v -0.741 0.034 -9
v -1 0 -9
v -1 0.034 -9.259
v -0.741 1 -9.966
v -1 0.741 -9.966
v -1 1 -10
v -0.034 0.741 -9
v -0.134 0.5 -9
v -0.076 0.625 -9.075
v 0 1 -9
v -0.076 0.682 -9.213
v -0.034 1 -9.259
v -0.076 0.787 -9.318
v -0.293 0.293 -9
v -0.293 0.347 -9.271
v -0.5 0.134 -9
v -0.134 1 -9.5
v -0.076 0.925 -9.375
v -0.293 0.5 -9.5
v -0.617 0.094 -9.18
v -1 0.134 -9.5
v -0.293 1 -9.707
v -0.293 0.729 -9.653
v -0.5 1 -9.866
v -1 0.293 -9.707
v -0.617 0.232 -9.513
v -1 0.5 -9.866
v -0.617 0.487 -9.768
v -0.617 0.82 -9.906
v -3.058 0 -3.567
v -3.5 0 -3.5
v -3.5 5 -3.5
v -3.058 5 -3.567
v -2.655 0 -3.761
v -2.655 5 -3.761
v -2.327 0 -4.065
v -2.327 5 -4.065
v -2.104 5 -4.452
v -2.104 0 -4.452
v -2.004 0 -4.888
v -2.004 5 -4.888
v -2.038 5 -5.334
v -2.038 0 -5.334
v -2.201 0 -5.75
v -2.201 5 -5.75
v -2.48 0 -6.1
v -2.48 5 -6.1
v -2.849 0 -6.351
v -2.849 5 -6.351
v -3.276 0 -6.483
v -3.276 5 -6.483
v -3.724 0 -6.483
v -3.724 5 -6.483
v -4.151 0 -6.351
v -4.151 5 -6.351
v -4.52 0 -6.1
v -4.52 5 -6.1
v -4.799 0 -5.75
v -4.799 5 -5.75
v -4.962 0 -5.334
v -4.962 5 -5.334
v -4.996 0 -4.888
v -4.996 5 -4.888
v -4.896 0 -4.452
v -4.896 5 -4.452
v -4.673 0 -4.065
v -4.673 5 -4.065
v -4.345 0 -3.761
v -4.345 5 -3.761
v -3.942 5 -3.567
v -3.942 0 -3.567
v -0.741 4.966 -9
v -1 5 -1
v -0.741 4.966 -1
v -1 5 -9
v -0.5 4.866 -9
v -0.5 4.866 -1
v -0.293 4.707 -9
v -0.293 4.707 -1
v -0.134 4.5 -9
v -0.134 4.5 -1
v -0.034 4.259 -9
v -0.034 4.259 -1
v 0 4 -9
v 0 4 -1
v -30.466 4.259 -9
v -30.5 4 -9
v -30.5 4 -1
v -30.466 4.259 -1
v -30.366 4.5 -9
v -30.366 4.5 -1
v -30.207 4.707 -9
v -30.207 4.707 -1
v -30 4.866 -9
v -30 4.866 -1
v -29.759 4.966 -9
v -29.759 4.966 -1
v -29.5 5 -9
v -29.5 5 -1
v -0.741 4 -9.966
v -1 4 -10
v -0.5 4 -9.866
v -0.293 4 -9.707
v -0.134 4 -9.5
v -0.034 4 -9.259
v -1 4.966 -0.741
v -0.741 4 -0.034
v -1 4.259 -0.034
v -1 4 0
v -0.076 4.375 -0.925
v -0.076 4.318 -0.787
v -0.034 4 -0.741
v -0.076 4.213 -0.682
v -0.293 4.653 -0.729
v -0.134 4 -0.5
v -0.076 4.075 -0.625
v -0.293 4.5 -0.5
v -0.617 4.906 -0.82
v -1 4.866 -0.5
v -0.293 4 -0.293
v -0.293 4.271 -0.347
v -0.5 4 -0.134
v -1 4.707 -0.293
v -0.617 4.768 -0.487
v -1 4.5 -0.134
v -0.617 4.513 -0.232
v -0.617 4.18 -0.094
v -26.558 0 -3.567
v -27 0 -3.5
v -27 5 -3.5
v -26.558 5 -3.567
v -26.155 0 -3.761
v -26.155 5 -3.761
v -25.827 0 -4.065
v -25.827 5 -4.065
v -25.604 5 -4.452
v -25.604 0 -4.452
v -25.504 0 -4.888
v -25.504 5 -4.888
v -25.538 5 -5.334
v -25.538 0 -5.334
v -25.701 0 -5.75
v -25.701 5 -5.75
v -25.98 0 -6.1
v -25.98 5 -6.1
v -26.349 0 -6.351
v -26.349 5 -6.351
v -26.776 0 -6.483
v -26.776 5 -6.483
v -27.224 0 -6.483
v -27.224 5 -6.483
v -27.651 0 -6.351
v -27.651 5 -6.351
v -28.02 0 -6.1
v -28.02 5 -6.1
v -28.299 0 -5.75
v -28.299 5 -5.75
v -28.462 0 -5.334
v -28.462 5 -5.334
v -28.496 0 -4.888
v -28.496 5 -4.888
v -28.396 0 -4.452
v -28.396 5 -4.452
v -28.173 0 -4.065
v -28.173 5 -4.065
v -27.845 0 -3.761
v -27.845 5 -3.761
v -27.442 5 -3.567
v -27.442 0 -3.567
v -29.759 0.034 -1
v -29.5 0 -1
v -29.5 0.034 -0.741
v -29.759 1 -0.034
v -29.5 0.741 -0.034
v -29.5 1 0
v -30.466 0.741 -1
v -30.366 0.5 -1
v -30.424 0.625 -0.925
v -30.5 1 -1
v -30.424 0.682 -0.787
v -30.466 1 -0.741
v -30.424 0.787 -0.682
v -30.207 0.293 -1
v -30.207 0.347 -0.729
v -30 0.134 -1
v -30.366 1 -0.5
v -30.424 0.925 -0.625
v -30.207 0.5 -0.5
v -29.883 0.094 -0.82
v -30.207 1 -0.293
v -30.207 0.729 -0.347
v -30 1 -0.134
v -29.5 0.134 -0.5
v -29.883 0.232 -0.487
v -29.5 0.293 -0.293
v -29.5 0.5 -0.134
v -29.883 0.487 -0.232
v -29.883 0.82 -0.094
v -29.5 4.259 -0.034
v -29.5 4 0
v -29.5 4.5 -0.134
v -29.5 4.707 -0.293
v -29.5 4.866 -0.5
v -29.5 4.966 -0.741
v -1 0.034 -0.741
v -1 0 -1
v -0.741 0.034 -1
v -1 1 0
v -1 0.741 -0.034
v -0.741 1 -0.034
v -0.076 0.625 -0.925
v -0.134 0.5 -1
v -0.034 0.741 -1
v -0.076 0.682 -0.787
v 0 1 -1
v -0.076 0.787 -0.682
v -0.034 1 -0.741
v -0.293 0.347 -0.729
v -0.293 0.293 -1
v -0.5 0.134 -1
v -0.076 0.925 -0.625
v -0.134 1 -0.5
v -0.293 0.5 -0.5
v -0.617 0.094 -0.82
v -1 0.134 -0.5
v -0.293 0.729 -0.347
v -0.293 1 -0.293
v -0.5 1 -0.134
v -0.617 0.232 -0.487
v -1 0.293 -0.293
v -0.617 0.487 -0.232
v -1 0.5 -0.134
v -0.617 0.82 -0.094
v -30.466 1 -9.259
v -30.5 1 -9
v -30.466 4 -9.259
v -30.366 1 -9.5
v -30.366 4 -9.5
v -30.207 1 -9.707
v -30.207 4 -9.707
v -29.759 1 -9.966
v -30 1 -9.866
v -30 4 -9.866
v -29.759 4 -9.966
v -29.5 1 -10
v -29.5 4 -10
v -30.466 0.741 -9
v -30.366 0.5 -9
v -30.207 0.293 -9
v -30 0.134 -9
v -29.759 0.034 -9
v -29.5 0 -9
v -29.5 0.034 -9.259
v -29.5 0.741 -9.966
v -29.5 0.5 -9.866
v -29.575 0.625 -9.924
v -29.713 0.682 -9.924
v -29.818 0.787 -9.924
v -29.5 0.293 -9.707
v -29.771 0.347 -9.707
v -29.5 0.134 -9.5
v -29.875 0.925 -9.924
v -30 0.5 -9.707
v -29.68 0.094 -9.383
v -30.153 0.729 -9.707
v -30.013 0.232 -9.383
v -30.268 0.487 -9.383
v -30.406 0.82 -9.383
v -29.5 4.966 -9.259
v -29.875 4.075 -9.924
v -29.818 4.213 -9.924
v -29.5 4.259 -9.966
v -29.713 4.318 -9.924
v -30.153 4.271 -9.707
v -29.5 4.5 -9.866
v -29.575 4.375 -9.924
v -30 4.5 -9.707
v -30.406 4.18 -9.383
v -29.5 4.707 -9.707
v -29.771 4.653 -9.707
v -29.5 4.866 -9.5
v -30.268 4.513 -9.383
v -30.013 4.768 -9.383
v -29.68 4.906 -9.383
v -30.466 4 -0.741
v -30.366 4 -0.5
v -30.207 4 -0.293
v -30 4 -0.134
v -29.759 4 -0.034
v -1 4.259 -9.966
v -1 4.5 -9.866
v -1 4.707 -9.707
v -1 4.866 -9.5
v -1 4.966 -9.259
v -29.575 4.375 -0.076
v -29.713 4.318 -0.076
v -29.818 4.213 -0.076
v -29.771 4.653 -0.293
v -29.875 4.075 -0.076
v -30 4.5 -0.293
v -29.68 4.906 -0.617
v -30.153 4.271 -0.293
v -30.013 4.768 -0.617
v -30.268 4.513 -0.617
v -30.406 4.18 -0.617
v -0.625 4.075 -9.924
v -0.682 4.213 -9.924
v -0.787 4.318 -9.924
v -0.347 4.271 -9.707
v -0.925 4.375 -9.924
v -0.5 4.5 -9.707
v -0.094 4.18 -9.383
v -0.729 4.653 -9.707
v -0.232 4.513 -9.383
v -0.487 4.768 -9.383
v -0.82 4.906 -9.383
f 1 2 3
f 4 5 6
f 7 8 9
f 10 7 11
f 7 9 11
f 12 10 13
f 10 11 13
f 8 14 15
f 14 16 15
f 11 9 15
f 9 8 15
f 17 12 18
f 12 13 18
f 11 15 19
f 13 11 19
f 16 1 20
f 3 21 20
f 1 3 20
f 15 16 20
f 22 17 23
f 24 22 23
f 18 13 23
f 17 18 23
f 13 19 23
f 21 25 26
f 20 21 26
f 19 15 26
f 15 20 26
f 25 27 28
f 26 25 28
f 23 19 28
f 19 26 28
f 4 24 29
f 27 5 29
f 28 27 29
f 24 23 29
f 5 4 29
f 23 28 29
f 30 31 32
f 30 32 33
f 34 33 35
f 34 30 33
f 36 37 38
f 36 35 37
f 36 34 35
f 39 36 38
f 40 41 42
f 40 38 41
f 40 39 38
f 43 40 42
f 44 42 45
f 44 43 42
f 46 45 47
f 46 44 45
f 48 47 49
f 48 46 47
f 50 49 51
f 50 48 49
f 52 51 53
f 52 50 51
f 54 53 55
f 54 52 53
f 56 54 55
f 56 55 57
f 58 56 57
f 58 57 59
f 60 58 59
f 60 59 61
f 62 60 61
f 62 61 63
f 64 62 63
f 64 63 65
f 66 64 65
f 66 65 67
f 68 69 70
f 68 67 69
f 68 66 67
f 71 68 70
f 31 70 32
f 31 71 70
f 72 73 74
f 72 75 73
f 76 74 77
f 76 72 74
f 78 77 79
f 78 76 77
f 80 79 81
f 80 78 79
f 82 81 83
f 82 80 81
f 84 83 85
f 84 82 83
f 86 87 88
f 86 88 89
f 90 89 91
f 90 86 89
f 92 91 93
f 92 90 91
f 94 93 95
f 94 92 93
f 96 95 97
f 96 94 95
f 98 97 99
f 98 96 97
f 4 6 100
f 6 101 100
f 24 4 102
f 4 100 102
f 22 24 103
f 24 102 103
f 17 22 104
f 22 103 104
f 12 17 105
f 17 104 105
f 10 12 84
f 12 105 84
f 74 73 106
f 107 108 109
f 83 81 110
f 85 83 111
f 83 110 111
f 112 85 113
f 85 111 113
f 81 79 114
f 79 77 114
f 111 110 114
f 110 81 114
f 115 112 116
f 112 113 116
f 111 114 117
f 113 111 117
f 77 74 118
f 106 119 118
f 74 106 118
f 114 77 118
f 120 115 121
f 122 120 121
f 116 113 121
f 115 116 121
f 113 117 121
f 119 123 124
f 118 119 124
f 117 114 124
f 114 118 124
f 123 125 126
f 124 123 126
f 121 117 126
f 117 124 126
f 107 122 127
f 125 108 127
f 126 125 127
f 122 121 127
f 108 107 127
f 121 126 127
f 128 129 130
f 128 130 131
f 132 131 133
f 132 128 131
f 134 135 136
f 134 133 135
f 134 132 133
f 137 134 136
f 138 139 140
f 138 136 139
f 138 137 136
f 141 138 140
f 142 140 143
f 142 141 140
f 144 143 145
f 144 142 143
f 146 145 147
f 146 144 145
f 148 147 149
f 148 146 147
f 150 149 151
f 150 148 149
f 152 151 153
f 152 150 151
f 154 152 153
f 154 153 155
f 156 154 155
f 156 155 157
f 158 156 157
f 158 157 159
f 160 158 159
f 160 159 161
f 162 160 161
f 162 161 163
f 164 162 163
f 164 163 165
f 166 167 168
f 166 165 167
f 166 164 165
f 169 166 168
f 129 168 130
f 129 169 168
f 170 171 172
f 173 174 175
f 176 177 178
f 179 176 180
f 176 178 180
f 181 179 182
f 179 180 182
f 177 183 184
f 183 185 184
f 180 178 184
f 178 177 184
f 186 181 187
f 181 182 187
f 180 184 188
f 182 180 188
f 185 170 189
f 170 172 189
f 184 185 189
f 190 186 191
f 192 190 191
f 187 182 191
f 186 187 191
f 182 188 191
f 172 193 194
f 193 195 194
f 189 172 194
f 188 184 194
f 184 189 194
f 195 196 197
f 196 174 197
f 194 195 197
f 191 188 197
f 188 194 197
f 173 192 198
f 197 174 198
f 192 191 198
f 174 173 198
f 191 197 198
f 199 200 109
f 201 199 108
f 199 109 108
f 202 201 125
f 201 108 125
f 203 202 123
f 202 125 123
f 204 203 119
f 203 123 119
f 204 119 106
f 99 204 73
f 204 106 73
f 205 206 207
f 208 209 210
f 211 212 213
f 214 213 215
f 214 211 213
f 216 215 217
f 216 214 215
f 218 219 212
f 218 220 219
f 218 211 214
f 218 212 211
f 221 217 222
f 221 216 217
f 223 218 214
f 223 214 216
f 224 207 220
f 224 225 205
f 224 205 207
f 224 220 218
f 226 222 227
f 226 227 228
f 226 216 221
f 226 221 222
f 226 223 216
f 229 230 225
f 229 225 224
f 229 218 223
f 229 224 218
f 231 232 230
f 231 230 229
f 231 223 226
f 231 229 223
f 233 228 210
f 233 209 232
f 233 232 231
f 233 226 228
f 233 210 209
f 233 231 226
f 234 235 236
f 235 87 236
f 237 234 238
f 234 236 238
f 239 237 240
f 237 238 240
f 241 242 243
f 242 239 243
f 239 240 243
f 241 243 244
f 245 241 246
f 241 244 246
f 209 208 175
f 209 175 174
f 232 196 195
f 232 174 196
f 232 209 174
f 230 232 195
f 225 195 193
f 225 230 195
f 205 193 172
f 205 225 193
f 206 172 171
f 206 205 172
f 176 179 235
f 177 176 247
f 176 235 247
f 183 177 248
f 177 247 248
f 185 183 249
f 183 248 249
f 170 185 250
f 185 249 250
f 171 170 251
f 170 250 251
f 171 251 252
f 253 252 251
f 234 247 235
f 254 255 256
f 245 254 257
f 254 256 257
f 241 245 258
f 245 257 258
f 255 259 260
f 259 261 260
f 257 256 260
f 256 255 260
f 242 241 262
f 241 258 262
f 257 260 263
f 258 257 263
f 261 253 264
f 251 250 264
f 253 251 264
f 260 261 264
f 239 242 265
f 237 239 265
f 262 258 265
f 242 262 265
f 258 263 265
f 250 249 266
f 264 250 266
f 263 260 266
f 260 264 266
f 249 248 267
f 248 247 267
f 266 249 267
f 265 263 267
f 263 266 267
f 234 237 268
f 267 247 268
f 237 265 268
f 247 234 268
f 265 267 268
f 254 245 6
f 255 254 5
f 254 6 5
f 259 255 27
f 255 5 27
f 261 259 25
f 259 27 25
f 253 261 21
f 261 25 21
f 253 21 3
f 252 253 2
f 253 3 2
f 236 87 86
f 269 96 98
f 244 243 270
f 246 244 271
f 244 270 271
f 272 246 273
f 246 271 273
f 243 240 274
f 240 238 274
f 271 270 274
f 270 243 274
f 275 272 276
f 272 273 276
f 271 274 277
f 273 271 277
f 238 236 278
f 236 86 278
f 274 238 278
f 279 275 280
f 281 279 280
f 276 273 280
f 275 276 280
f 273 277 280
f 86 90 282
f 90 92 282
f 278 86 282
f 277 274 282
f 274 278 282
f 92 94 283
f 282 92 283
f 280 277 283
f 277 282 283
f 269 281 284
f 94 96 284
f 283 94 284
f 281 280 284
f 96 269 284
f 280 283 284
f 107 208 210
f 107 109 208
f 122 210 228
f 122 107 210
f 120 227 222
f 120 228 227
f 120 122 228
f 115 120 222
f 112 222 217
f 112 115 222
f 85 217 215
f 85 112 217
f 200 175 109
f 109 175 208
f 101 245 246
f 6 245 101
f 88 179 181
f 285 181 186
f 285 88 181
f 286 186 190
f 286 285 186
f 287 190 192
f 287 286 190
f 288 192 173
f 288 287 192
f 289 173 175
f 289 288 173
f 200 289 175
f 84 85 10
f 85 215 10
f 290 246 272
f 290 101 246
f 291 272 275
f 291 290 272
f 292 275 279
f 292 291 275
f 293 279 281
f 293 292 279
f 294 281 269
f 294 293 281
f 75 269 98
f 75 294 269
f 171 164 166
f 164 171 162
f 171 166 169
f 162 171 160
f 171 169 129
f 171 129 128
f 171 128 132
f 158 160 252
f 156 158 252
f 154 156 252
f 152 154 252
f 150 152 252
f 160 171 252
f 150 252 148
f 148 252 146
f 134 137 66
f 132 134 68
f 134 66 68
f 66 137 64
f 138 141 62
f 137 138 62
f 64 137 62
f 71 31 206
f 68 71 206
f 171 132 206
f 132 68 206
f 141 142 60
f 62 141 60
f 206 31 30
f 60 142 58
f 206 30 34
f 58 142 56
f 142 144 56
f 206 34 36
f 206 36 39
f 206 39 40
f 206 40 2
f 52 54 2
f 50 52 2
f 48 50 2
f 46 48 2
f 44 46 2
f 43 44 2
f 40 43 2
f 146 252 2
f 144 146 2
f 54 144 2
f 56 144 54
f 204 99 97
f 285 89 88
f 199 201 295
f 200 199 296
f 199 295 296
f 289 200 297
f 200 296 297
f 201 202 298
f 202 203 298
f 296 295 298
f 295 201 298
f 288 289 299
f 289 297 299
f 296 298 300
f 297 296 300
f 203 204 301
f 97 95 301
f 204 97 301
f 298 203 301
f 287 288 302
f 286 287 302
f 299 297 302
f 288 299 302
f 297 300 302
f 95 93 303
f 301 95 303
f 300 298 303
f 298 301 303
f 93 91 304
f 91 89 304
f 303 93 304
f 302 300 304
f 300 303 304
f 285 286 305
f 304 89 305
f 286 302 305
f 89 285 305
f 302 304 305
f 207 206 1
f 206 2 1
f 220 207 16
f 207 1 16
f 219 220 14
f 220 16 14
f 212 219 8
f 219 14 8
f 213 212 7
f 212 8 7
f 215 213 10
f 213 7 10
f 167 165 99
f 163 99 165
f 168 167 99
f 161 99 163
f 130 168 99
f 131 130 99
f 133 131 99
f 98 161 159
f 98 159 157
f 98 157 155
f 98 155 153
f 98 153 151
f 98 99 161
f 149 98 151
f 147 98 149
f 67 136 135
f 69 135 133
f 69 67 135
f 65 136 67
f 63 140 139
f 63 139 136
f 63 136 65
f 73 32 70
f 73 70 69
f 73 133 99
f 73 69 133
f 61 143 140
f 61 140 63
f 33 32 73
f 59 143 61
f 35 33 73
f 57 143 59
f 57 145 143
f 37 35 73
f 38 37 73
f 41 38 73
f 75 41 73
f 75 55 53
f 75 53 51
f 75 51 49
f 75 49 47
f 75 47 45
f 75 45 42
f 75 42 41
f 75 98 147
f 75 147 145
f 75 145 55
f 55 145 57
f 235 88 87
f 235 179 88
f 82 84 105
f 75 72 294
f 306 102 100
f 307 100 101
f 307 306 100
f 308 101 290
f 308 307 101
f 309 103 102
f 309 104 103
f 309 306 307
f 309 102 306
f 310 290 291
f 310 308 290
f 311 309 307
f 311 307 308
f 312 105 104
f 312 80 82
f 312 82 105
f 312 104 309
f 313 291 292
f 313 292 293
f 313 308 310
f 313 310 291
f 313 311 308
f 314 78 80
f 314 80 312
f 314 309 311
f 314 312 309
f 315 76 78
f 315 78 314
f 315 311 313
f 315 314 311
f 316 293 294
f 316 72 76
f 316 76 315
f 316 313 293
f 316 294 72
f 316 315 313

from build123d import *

# Parameters (mm, degrees)
SKETCH1_W               = 30.5
SKETCH1_H               = 10
BOSS_EXTRUDE1_DEPTH     = 5
CUT_EXTRUDE1_DEPTH      = 33.484611742
CUT_EXTRUDE1_DEPTH_BACK = 33.484611742
SKETCH2_R               = 1.5
FILLET1_R               = 1


with BuildPart() as part:
    # Sketch1 → Boss-Extrude1 (new body)
    with BuildSketch(Plane(origin=(0, 0, 0), x_dir=(1, 0, 0), z_dir=(0, 1, 0))):
        with Locations((-15.25, 5)):
            Rectangle(SKETCH1_W, SKETCH1_H)
    extrude(amount=BOSS_EXTRUDE1_DEPTH)

    # Sketch2 → Cut-Extrude1 (cut, two sides: drawn at the far end of the back side and taken through both)
    with BuildSketch(Plane(origin=(0, 5, 0), x_dir=(1, 0, 0), z_dir=(0, 1, 0)).offset(-CUT_EXTRUDE1_DEPTH_BACK)):
        with Locations(Location((-27, 5, 0), (0, 0, 270))):
            Circle(SKETCH2_R)
        with Locations(Location((-3.5, 5, 0), (0, 0, 270))):
            Circle(SKETCH2_R)
    extrude(amount=CUT_EXTRUDE1_DEPTH + CUT_EXTRUDE1_DEPTH_BACK, mode=Mode.SUBTRACT)

    # Fillet1
    fillet1_edges = [part.edges().sort_by_distance(p)[0] for p in [
        (-30.5, 5, -5),
        (-15.25, 5, 0),
        (0, 5, -5),
        (-15.25, 0, 0),
        (-30.5, 0, -5),
        (-15.25, 0, -10),
        (0, 0, -5),
        (0, 2.5, 0),
        (-30.5, 2.5, 0),
        (-30.5, 2.5, -10),
        (0, 2.5, -10),
        (-15.25, 5, -10),
    ]]
    fillet(fillet1_edges, radius=FILLET1_R)


solid = part.part
